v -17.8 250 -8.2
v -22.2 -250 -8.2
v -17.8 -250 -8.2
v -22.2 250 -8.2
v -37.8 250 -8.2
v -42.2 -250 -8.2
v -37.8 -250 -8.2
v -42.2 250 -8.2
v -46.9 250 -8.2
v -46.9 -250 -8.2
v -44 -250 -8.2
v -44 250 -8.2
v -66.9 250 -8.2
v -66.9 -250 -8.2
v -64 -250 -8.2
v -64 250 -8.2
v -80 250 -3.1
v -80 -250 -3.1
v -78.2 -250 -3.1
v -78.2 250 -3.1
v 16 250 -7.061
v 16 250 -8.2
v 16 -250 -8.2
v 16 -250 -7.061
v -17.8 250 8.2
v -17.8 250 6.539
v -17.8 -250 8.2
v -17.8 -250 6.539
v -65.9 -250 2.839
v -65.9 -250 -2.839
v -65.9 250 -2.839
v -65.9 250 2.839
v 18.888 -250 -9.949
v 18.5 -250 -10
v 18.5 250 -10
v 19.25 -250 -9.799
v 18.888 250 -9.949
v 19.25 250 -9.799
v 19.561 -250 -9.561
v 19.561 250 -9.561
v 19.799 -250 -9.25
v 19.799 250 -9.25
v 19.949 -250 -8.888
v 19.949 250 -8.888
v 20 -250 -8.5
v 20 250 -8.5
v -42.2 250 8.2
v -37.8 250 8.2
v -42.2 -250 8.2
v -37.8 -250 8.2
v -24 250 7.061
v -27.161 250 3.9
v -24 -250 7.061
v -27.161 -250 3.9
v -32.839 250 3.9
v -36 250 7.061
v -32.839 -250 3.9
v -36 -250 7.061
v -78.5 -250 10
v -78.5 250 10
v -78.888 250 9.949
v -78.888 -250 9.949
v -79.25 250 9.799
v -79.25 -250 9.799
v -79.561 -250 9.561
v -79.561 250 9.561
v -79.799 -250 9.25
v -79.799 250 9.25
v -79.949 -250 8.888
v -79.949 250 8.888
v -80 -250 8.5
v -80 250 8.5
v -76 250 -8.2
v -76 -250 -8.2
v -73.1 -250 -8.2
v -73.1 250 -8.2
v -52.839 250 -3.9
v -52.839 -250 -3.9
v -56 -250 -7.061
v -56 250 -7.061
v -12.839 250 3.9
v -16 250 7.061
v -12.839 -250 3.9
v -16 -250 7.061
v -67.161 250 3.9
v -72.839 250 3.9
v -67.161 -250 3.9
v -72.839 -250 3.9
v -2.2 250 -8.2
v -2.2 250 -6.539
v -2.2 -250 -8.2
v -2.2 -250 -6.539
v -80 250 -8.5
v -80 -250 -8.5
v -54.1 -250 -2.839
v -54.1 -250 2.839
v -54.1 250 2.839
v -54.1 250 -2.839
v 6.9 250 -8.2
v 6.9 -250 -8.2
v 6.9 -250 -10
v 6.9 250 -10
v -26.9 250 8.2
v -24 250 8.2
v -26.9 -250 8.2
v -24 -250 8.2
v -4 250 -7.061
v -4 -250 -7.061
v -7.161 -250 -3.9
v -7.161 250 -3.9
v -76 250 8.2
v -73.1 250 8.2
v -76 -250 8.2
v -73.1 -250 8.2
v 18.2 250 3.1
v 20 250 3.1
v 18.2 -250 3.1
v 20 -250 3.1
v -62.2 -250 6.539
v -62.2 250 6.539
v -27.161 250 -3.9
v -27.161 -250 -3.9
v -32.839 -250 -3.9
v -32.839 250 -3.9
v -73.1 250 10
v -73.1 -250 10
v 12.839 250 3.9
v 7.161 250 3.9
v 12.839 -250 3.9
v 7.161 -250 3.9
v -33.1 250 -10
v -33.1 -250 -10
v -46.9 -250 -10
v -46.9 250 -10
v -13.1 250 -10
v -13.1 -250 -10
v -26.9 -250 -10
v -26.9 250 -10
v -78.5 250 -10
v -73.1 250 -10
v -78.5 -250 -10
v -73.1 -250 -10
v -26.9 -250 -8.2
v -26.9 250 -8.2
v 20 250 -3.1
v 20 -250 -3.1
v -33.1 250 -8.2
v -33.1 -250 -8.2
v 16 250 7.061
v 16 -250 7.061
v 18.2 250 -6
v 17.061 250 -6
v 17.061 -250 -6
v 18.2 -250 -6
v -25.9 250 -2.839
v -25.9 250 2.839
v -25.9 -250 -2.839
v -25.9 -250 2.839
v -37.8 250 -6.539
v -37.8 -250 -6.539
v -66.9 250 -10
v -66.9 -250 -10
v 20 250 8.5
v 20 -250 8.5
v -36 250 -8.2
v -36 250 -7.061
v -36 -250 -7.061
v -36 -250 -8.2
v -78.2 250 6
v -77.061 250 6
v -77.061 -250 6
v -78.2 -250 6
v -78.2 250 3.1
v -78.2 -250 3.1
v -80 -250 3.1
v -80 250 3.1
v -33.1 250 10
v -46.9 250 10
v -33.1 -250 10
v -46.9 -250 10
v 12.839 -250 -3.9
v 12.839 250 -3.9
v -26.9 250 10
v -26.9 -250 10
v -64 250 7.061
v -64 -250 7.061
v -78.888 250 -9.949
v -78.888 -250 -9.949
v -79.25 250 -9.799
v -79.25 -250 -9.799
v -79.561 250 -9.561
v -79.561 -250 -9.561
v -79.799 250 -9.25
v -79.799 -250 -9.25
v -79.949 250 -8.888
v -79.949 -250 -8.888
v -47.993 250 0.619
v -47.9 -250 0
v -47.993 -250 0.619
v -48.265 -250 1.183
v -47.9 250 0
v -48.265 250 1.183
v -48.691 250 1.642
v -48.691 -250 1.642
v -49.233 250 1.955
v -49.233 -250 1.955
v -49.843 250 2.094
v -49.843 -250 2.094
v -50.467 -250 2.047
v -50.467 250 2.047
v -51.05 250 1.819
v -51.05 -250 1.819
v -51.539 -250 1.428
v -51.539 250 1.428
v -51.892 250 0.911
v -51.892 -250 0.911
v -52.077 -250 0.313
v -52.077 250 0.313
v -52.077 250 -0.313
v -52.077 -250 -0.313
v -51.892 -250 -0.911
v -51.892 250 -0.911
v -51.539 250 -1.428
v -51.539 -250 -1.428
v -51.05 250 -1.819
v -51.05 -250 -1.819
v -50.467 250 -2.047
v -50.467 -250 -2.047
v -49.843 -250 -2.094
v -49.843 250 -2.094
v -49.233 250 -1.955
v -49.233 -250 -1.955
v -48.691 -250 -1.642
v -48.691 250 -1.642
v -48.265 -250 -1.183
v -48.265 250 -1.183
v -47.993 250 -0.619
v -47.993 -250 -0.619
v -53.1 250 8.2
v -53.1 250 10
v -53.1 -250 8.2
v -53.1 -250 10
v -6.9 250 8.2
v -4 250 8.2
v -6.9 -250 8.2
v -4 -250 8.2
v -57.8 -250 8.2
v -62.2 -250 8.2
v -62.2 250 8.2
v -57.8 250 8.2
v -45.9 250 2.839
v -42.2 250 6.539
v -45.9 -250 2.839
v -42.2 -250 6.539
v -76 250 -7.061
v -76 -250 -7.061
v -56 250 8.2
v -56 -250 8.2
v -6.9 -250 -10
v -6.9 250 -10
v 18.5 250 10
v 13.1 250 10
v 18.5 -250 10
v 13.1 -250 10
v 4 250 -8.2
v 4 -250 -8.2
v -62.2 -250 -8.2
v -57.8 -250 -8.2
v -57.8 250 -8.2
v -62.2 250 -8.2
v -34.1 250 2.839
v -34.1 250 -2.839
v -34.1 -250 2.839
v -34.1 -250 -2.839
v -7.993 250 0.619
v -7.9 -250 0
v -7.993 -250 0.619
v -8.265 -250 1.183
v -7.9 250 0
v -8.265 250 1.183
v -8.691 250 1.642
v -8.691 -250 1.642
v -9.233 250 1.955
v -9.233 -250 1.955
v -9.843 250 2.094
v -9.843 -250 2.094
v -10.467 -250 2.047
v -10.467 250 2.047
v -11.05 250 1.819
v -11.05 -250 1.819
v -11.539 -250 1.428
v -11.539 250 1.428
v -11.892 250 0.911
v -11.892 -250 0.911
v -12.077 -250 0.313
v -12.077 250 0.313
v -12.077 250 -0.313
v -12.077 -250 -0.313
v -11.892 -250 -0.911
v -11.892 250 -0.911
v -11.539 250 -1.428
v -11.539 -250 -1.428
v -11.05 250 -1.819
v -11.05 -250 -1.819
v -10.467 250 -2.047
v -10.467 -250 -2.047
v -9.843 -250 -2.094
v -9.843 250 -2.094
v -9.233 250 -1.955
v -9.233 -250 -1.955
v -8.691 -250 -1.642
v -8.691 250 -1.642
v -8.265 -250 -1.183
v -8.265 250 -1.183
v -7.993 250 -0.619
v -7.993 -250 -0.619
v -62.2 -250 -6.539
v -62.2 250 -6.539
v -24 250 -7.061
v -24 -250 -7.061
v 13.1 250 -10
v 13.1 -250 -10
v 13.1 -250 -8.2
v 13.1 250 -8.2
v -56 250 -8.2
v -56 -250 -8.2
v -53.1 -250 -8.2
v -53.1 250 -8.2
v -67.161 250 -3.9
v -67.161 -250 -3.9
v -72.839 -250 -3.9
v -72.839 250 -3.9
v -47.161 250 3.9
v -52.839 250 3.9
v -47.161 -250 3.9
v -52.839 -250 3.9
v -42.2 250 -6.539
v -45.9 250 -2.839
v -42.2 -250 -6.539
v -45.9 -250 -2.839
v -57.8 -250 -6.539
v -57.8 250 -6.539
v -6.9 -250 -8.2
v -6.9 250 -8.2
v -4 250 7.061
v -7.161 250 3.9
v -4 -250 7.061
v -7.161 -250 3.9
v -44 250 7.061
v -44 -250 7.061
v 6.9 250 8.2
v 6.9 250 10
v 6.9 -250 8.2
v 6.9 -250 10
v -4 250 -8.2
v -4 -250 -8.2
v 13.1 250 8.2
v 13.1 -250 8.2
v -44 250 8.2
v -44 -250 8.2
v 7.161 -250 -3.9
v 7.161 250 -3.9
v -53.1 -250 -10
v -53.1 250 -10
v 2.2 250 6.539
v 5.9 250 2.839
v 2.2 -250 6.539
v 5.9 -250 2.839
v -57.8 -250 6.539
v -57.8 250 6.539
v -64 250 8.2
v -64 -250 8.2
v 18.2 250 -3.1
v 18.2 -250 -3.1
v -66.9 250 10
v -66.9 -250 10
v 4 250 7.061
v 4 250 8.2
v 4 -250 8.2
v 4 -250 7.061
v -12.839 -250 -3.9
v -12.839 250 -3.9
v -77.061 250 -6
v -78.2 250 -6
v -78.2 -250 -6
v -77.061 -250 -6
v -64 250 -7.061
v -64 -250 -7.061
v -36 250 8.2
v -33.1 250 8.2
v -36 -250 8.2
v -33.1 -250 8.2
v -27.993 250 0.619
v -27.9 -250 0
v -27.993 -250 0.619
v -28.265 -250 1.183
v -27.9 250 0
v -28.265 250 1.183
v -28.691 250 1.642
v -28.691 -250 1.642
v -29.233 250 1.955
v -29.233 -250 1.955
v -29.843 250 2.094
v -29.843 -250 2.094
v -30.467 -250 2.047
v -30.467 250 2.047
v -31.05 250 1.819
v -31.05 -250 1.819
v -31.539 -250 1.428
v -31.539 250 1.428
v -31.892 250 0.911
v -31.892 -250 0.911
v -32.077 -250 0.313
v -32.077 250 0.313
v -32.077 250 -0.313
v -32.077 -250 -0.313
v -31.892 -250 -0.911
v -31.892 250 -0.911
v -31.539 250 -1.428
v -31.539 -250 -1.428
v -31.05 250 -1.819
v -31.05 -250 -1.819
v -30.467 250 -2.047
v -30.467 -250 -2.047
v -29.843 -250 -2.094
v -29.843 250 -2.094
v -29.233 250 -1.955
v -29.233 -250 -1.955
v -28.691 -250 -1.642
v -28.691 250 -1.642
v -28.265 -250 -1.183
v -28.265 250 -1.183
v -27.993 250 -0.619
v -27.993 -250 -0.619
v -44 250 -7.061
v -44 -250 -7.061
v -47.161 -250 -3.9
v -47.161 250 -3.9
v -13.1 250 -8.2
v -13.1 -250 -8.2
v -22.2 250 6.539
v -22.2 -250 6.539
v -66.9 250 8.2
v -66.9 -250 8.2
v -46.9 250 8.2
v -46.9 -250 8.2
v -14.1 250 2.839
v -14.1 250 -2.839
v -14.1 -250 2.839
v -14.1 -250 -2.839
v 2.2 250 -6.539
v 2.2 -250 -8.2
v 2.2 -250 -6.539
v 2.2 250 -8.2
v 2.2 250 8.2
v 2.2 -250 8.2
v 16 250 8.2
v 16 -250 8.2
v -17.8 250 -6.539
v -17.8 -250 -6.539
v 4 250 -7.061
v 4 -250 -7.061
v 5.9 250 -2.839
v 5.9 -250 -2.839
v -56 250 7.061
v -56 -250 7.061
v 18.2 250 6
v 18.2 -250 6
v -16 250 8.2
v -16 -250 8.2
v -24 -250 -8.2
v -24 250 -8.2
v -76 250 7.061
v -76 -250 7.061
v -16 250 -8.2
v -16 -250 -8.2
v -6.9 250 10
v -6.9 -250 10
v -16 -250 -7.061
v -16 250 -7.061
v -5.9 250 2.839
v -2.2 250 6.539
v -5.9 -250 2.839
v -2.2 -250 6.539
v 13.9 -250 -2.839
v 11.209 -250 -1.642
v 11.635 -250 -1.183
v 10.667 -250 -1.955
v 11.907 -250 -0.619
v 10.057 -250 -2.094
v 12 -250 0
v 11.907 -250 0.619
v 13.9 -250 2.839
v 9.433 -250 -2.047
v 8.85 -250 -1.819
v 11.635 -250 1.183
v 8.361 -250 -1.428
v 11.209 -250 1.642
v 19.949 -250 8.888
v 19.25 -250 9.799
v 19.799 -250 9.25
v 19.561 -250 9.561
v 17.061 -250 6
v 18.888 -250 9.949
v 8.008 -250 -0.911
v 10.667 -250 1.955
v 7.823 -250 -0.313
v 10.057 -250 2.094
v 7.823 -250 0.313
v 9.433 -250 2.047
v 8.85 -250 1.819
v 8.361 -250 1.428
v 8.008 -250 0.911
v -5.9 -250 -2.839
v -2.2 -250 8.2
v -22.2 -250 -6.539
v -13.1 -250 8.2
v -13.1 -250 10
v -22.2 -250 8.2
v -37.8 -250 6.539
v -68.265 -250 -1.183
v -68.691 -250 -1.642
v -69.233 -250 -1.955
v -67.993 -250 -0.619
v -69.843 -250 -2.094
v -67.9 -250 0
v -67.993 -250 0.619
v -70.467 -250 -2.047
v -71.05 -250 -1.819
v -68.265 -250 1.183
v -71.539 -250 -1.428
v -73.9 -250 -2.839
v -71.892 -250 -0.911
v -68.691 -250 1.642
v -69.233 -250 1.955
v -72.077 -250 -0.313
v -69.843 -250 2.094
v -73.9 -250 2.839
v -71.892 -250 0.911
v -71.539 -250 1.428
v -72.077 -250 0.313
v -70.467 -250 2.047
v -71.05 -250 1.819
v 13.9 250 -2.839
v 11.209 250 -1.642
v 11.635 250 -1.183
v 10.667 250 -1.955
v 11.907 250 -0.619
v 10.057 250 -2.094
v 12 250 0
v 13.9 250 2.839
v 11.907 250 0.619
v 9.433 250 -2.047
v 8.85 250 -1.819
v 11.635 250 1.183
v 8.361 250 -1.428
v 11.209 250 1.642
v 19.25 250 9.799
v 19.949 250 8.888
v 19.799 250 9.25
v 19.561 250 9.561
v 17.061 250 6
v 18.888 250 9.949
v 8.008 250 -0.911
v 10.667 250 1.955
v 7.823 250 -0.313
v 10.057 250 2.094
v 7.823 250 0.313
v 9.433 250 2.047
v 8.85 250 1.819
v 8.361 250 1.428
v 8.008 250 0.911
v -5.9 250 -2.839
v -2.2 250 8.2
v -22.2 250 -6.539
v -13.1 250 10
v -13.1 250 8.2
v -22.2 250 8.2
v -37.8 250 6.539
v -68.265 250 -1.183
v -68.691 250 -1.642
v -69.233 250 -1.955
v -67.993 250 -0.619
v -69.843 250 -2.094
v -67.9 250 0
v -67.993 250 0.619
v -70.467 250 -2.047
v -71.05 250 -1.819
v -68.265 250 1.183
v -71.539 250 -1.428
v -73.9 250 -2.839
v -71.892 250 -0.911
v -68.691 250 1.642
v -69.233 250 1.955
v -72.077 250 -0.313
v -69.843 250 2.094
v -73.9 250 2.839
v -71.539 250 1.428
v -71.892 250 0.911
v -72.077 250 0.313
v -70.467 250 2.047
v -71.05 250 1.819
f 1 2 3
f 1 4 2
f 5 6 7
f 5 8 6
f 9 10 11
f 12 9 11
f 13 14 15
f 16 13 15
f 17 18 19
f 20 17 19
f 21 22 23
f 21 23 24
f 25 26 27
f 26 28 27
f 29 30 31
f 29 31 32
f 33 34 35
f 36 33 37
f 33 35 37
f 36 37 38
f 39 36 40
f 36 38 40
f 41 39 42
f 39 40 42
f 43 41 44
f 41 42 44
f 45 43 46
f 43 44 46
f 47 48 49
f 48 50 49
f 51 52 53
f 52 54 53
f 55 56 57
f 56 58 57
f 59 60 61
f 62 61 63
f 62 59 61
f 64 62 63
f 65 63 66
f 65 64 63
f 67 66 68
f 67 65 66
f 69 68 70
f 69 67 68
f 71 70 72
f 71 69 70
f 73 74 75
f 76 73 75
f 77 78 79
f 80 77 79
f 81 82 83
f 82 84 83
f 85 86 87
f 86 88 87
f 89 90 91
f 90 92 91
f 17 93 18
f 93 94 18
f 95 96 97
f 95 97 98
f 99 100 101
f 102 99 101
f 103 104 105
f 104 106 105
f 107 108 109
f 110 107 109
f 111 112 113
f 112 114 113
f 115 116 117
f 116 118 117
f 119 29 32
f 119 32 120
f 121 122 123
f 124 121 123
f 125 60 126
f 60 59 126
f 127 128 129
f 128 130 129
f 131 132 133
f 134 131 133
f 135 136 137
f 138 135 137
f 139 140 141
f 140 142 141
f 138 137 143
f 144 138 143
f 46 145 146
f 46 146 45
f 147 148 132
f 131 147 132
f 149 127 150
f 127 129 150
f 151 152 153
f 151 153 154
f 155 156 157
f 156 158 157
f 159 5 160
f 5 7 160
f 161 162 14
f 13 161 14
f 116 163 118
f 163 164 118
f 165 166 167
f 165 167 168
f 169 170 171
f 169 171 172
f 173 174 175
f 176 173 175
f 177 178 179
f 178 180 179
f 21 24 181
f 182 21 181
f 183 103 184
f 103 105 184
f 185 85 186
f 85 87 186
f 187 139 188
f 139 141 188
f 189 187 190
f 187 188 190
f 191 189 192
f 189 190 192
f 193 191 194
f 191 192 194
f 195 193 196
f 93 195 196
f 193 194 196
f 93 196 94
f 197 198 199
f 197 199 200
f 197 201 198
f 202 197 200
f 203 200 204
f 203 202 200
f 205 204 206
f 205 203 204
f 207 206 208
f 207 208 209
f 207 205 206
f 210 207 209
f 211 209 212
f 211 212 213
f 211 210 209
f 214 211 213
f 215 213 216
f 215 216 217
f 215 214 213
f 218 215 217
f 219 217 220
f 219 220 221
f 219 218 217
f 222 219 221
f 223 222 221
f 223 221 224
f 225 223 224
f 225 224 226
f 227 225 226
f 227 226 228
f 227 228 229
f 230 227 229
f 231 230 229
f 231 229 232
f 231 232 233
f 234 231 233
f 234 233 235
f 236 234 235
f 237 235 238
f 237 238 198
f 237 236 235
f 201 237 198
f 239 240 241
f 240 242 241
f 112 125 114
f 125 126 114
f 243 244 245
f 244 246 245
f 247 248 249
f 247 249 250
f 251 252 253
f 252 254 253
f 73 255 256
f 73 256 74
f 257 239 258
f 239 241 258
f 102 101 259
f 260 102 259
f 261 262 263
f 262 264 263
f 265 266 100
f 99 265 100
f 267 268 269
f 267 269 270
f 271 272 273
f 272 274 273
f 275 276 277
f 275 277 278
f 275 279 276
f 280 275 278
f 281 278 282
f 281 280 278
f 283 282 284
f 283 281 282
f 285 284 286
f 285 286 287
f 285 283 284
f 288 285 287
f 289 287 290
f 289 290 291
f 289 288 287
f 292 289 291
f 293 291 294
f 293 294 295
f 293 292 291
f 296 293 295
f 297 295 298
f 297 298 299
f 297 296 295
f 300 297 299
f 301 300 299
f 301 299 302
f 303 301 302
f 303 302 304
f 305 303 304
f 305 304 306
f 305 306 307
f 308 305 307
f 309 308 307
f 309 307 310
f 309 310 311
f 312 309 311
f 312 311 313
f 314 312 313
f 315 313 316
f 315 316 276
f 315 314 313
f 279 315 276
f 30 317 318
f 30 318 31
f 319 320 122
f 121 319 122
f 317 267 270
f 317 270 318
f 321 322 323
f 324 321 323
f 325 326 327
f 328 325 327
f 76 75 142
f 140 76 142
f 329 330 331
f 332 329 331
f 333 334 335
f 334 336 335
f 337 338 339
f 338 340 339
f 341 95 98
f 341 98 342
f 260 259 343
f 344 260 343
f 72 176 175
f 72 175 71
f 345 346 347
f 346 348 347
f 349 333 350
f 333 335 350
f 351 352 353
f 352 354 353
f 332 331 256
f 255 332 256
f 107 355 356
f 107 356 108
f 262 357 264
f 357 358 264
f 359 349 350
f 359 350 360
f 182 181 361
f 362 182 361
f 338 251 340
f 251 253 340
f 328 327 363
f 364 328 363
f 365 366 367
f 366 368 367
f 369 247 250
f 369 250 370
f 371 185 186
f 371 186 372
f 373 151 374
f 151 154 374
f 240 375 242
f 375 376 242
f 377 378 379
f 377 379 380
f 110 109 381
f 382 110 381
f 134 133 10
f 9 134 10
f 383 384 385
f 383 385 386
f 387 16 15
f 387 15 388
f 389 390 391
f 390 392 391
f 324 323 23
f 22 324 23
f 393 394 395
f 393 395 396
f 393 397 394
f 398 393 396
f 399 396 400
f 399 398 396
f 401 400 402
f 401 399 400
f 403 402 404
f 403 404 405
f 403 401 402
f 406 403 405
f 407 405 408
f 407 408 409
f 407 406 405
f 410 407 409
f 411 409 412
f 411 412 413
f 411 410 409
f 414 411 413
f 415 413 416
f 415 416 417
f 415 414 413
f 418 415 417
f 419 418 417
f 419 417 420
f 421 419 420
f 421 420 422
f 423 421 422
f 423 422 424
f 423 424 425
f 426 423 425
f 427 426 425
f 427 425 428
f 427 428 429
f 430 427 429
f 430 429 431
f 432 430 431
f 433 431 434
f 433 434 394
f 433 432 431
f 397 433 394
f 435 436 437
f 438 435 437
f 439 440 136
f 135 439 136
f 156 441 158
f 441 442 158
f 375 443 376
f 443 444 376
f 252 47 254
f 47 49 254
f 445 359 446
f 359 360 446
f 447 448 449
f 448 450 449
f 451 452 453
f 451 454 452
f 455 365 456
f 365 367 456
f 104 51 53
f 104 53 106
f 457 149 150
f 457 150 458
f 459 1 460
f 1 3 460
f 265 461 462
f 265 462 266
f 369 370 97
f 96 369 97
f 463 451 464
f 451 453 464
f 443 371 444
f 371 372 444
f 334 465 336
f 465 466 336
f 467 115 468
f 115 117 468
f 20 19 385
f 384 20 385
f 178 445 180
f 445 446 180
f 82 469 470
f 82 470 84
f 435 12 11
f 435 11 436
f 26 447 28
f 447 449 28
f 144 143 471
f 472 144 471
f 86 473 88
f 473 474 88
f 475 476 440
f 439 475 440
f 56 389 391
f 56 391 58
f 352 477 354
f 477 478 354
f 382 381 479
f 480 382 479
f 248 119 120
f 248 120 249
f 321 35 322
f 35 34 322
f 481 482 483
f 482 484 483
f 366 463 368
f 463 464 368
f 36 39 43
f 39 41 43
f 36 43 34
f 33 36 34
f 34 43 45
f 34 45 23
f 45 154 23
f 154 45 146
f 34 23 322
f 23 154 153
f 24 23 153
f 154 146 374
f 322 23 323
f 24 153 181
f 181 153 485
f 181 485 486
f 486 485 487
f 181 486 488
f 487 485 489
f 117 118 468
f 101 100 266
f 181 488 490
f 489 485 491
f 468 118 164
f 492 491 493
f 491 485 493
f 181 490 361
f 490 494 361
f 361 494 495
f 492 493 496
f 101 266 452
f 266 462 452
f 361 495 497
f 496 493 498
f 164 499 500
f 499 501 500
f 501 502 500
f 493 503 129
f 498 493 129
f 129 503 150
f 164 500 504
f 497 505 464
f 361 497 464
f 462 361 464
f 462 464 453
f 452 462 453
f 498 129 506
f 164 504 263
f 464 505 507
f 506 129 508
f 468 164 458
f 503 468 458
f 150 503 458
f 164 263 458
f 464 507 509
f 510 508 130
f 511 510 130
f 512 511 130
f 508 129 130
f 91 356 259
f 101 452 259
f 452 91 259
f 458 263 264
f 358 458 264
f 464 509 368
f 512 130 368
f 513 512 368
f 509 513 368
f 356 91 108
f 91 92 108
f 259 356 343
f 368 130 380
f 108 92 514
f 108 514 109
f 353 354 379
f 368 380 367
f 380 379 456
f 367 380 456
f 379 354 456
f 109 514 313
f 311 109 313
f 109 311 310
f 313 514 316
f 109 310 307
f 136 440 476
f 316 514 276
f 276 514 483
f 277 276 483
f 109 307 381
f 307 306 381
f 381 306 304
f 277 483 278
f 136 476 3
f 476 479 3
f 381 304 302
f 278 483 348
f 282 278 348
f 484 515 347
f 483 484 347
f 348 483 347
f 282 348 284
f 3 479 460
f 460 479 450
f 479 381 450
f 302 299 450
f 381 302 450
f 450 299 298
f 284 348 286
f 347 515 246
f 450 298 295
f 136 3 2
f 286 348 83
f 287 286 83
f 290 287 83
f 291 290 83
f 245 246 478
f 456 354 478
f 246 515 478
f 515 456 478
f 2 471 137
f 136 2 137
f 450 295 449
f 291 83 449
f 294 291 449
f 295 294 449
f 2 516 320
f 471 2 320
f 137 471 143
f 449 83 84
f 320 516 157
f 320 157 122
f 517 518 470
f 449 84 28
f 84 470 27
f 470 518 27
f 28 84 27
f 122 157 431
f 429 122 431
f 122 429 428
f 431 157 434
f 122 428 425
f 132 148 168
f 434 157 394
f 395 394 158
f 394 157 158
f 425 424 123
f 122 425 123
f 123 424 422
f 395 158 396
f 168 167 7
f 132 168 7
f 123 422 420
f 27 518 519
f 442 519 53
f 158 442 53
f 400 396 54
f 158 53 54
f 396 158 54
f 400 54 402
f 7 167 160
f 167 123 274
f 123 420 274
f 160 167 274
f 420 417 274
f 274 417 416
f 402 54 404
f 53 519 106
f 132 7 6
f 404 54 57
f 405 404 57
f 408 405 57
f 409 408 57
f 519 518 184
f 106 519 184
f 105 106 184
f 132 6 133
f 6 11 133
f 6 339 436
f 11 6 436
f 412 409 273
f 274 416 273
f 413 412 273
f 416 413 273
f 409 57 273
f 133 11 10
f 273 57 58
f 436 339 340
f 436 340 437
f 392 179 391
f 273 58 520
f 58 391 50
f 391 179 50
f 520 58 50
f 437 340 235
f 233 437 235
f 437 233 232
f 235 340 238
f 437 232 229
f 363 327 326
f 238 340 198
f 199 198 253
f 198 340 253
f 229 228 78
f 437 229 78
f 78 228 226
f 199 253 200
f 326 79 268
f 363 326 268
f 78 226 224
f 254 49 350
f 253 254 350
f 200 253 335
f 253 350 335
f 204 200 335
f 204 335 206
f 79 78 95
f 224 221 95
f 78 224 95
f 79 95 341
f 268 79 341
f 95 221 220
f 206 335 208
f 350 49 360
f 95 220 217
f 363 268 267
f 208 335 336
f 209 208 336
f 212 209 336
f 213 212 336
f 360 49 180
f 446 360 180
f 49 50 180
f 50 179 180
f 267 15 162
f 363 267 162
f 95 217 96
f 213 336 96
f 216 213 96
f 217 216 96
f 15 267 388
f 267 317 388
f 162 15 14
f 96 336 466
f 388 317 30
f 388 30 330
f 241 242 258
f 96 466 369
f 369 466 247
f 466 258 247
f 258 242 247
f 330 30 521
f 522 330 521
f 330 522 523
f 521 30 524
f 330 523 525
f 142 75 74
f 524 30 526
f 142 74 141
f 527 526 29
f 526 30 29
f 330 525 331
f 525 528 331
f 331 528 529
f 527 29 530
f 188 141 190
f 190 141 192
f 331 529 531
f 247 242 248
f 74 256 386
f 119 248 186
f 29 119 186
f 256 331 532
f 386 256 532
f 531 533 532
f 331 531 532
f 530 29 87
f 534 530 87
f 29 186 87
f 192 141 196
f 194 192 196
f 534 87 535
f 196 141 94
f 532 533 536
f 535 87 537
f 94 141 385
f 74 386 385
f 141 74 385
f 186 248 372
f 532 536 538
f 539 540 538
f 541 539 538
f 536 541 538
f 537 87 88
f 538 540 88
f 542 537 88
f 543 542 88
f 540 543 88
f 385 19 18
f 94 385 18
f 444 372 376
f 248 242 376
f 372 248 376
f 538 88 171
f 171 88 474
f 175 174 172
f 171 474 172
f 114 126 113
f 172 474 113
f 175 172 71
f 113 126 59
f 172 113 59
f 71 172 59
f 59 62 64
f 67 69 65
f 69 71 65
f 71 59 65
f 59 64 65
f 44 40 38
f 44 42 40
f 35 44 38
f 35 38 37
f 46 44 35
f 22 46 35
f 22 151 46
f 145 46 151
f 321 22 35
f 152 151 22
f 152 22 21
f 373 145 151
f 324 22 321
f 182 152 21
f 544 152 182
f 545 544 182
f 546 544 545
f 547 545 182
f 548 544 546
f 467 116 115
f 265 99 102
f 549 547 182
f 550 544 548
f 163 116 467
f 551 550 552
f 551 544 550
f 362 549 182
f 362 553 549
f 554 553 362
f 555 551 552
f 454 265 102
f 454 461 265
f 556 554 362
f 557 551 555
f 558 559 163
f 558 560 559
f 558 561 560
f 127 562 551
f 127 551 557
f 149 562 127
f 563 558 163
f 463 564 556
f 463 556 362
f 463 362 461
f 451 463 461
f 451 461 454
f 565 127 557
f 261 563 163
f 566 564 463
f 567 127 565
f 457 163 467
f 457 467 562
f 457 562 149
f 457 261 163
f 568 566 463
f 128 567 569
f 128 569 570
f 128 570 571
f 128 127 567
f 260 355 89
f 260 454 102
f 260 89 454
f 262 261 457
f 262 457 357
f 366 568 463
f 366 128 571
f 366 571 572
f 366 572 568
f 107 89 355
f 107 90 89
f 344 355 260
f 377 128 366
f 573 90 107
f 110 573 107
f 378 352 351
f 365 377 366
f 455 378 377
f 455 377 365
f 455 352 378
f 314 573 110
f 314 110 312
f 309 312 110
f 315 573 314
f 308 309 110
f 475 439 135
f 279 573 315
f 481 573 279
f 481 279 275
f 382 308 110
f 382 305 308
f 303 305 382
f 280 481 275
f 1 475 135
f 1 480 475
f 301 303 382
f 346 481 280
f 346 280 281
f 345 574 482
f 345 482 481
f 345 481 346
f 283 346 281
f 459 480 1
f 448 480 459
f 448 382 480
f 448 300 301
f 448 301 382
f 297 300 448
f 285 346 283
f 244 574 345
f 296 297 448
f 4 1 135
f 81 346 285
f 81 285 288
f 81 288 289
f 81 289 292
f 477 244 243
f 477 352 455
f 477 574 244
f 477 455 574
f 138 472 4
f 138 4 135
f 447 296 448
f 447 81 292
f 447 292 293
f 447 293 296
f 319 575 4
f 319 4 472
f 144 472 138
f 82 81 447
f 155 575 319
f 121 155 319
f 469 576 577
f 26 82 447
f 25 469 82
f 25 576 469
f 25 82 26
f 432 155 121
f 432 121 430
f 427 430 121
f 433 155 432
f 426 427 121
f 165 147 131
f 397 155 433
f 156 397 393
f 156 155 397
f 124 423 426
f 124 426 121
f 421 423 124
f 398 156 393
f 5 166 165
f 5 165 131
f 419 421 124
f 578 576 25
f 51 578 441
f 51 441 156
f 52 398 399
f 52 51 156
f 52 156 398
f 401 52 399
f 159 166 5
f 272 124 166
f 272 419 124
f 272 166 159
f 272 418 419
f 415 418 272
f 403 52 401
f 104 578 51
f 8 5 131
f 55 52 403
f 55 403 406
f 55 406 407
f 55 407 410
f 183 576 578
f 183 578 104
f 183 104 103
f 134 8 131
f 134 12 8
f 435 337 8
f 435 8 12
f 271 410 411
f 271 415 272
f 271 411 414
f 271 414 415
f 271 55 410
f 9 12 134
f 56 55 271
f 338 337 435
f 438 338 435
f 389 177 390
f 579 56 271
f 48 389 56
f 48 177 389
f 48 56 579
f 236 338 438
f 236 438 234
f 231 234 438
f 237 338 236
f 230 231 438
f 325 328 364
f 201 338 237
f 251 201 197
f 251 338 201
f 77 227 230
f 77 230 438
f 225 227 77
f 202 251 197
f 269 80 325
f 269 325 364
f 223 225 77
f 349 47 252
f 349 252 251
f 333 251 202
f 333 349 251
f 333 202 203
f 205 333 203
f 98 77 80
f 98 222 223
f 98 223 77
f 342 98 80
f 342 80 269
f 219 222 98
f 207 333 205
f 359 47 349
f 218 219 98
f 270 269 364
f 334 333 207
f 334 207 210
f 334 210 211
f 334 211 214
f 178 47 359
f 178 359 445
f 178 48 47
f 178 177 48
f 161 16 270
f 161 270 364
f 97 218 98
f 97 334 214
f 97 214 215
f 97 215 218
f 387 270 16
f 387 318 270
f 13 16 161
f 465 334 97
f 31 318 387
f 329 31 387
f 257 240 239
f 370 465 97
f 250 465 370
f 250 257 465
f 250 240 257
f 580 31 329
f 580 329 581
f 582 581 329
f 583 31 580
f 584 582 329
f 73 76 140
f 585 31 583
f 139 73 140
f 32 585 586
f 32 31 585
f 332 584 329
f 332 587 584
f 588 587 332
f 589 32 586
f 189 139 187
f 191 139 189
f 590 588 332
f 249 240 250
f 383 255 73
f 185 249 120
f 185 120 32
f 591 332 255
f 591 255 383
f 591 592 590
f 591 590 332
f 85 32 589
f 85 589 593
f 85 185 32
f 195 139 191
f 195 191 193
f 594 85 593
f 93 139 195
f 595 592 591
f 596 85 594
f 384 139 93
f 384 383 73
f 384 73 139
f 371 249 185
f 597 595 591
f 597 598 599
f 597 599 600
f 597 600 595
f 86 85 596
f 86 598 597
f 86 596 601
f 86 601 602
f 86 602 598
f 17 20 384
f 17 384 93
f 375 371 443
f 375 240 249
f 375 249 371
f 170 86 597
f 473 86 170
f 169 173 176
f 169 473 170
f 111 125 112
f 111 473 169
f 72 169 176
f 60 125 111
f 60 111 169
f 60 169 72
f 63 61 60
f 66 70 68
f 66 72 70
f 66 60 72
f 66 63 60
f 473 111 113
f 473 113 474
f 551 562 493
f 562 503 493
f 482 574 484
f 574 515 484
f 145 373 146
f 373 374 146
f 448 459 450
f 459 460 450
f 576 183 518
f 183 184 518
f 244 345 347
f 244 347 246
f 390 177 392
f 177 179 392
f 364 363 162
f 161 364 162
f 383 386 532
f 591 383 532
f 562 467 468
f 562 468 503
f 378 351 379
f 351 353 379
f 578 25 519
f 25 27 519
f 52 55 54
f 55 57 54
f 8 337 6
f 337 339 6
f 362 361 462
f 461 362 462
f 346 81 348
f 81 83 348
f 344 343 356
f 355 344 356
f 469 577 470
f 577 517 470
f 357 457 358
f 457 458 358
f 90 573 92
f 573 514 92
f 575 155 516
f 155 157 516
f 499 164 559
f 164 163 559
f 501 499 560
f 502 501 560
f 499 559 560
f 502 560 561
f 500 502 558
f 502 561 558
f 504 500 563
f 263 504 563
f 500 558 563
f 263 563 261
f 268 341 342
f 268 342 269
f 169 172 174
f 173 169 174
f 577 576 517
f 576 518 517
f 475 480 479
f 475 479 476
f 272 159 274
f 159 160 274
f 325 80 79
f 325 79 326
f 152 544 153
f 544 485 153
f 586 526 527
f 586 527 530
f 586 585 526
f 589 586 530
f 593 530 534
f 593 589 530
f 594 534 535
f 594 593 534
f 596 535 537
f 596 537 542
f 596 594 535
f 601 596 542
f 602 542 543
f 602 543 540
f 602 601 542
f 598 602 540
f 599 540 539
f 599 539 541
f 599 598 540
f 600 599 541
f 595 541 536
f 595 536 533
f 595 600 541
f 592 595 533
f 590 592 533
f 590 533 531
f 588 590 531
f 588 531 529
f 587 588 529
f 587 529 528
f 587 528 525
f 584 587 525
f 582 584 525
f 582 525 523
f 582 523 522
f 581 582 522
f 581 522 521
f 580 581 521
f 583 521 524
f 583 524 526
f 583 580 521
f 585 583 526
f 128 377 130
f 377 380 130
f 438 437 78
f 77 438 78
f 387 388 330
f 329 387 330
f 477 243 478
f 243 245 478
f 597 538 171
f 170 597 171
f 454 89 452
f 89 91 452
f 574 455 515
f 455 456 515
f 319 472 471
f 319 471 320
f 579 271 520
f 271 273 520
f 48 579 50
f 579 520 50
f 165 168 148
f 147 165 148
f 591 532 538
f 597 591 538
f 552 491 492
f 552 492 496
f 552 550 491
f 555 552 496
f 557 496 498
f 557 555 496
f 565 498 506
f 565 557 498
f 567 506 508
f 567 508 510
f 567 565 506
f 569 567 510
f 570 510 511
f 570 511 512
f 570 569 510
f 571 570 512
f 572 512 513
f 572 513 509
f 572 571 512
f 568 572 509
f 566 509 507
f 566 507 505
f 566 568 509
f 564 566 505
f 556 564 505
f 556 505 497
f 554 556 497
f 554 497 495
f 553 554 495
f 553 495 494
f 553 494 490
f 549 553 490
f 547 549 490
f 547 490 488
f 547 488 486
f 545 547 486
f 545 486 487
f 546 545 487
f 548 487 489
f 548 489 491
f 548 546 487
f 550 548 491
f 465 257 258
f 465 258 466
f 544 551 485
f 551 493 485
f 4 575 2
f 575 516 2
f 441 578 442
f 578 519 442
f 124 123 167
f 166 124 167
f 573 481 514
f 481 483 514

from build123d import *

# Parameters (mm, degrees)
SKETCH_R  = 2.1
PAD_DEPTH = 250
FILLET_R  = 1.5


with BuildPart() as part:
    # Sketch → Pad (new body, symmetric)
    with BuildSketch(Plane.XZ):
        Polygon((-10, 10), (-3.1, 10), (-3.1, 8.2), (-6, 8.2), (-6, 7.06066), (-2.83934, 3.9), (2.83934, 3.9), (6, 7.06066), (6, 8.2), (3.1, 8.2), (3.1, 10), (16.9, 10), (16.9, 8.2), (14, 8.2), (14, 7.06066), (17.16066, 3.9), (22.83934, 3.9), (26, 7.06066), (26, 8.2), (23.1, 8.2), (23.1, 10), (36.9, 10), (36.9, 8.2), (34, 8.2), (34, 7.06066), (37.16066, 3.9), (42.83934, 3.9), (46, 7.06066), (46, 8.2), (43.1, 8.2), (43.1, 10), (56.9, 10), (56.9, 8.2), (54, 8.2), (54, 7.06066), (57.16066, 3.9), (62.83934, 3.9), (66, 7.06066), (66, 8.2), (63.1, 8.2), (63.1, 10), (76.9, 10), (76.9, 8.2), (74, 8.2), (74, 7.06066), (77.16066, 3.9), (82.83934, 3.9), (86, 7.06066), (86, 8.2), (83.1, 8.2), (83.1, 10), (90, 10), (90, 3.1), (88.2, 3.1), (88.2, 6), (87.06066, 6), (83.9, 2.83934), (83.9, -2.83934), (87.06066, -6), (88.2, -6), (88.2, -3.1), (90, -3.1), (90, -10), (83.1, -10), (83.1, -8.2), (86, -8.2), (86, -7.06066), (82.83934, -3.9), (77.16066, -3.9), (74, -7.06066), (74, -8.2), (76.9, -8.2), (76.9, -10), (63.1, -10), (63.1, -8.2), (66, -8.2), (66, -7.06066), (62.83934, -3.9), (57.16066, -3.9), (54, -7.06066), (54, -8.2), (56.9, -8.2), (56.9, -10), (43.1, -10), (43.1, -8.2), (46, -8.2), (46, -7.06066), (42.83934, -3.9), (37.16066, -3.9), (34, -7.06066), (34, -8.2), (36.9, -8.2), (36.9, -10), (23.1, -10), (23.1, -8.2), (26, -8.2), (26, -7.06066), (22.83934, -3.9), (17.16066, -3.9), (14, -7.06066), (14, -8.2), (16.9, -8.2), (16.9, -10), (3.1, -10), (3.1, -8.2), (6, -8.2), (6, -7.06066), (2.83934, -3.9), (-2.83934, -3.9), (-6, -7.06066), (-6, -8.2), (-3.1, -8.2), (-3.1, -10), (-10, -10), (-10, -3.1), (-8.2, -3.1), (-8.2, -6), (-7.06066, -6), (-3.9, -2.83934), (-3.9, 2.83934), (-7.06066, 6), (-8.2, 6), (-8.2, 3.1), (-10, 3.1), align=None)
        Circle(SKETCH_R, mode=Mode.SUBTRACT)
        with Locations((20, 0)):
            Circle(SKETCH_R, mode=Mode.SUBTRACT)
        with Locations((40, 0)):
            Circle(SKETCH_R, mode=Mode.SUBTRACT)
        with Locations((79.9, 0)):
            Circle(SKETCH_R, mode=Mode.SUBTRACT)
        with Locations((60, 0)):
            Circle(SKETCH_R, mode=Mode.SUBTRACT)
        Polygon((7.8, -6.53934), (4.1, -2.83934), (4.1, 2.83934), (7.8, 6.53934), (7.8, 8.2), (12.2, 8.2), (12.2, 6.53934), (15.9, 2.83934), (15.9, -2.83934), (12.2, -6.53934), (12.2, -8.2), (7.8, -8.2), align=None, mode=Mode.SUBTRACT)
        Polygon((27.8, 8.2), (27.8, 6.53934), (24.1, 2.83934), (24.1, -2.83934), (27.8, -6.53934), (27.8, -8.2), (32.2, -8.2), (32.2, -6.53934), (35.9, -2.83934), (35.9, 2.83934), (32.2, 6.53934), (32.2, 8.2), align=None, mode=Mode.SUBTRACT)
        Polygon((47.8, 8.2), (47.8, 6.53934), (44.1, 2.83934), (44.1, -2.83934), (47.8, -6.53934), (47.8, -8.2), (52.2, -8.2), (52.2, -6.53934), (55.9, -2.83934), (55.9, 2.83934), (52.2, 6.53934), (52.2, 8.2), align=None, mode=Mode.SUBTRACT)
        Polygon((72.2, -8.2), (72.2, -6.53934), (75.9, -2.83934), (75.9, 2.83934), (72.2, 6.53934), (72.2, 8.2), (67.8, 8.2), (67.8, 6.53934), (64.1, 2.83934), (64.1, -2.83934), (67.8, -6.53934), (67.8, -8.2), align=None, mode=Mode.SUBTRACT)
    extrude(amount=PAD_DEPTH, both=True)

    # Fillet
    fillet_edges = [part.edges().sort_by_distance(p)[0] for p in [
        (-10, 0, 10),
        (90, 0, 10),
        (90, 0, -10),
        (-10, 0, -10),
    ]]
    fillet(fillet_edges, radius=FILLET_R)


with BuildPart() as part_1:
    # Body placement: moved
    add(part.part.moved(Location((-70, 0, 0))))


solid = part_1.part
